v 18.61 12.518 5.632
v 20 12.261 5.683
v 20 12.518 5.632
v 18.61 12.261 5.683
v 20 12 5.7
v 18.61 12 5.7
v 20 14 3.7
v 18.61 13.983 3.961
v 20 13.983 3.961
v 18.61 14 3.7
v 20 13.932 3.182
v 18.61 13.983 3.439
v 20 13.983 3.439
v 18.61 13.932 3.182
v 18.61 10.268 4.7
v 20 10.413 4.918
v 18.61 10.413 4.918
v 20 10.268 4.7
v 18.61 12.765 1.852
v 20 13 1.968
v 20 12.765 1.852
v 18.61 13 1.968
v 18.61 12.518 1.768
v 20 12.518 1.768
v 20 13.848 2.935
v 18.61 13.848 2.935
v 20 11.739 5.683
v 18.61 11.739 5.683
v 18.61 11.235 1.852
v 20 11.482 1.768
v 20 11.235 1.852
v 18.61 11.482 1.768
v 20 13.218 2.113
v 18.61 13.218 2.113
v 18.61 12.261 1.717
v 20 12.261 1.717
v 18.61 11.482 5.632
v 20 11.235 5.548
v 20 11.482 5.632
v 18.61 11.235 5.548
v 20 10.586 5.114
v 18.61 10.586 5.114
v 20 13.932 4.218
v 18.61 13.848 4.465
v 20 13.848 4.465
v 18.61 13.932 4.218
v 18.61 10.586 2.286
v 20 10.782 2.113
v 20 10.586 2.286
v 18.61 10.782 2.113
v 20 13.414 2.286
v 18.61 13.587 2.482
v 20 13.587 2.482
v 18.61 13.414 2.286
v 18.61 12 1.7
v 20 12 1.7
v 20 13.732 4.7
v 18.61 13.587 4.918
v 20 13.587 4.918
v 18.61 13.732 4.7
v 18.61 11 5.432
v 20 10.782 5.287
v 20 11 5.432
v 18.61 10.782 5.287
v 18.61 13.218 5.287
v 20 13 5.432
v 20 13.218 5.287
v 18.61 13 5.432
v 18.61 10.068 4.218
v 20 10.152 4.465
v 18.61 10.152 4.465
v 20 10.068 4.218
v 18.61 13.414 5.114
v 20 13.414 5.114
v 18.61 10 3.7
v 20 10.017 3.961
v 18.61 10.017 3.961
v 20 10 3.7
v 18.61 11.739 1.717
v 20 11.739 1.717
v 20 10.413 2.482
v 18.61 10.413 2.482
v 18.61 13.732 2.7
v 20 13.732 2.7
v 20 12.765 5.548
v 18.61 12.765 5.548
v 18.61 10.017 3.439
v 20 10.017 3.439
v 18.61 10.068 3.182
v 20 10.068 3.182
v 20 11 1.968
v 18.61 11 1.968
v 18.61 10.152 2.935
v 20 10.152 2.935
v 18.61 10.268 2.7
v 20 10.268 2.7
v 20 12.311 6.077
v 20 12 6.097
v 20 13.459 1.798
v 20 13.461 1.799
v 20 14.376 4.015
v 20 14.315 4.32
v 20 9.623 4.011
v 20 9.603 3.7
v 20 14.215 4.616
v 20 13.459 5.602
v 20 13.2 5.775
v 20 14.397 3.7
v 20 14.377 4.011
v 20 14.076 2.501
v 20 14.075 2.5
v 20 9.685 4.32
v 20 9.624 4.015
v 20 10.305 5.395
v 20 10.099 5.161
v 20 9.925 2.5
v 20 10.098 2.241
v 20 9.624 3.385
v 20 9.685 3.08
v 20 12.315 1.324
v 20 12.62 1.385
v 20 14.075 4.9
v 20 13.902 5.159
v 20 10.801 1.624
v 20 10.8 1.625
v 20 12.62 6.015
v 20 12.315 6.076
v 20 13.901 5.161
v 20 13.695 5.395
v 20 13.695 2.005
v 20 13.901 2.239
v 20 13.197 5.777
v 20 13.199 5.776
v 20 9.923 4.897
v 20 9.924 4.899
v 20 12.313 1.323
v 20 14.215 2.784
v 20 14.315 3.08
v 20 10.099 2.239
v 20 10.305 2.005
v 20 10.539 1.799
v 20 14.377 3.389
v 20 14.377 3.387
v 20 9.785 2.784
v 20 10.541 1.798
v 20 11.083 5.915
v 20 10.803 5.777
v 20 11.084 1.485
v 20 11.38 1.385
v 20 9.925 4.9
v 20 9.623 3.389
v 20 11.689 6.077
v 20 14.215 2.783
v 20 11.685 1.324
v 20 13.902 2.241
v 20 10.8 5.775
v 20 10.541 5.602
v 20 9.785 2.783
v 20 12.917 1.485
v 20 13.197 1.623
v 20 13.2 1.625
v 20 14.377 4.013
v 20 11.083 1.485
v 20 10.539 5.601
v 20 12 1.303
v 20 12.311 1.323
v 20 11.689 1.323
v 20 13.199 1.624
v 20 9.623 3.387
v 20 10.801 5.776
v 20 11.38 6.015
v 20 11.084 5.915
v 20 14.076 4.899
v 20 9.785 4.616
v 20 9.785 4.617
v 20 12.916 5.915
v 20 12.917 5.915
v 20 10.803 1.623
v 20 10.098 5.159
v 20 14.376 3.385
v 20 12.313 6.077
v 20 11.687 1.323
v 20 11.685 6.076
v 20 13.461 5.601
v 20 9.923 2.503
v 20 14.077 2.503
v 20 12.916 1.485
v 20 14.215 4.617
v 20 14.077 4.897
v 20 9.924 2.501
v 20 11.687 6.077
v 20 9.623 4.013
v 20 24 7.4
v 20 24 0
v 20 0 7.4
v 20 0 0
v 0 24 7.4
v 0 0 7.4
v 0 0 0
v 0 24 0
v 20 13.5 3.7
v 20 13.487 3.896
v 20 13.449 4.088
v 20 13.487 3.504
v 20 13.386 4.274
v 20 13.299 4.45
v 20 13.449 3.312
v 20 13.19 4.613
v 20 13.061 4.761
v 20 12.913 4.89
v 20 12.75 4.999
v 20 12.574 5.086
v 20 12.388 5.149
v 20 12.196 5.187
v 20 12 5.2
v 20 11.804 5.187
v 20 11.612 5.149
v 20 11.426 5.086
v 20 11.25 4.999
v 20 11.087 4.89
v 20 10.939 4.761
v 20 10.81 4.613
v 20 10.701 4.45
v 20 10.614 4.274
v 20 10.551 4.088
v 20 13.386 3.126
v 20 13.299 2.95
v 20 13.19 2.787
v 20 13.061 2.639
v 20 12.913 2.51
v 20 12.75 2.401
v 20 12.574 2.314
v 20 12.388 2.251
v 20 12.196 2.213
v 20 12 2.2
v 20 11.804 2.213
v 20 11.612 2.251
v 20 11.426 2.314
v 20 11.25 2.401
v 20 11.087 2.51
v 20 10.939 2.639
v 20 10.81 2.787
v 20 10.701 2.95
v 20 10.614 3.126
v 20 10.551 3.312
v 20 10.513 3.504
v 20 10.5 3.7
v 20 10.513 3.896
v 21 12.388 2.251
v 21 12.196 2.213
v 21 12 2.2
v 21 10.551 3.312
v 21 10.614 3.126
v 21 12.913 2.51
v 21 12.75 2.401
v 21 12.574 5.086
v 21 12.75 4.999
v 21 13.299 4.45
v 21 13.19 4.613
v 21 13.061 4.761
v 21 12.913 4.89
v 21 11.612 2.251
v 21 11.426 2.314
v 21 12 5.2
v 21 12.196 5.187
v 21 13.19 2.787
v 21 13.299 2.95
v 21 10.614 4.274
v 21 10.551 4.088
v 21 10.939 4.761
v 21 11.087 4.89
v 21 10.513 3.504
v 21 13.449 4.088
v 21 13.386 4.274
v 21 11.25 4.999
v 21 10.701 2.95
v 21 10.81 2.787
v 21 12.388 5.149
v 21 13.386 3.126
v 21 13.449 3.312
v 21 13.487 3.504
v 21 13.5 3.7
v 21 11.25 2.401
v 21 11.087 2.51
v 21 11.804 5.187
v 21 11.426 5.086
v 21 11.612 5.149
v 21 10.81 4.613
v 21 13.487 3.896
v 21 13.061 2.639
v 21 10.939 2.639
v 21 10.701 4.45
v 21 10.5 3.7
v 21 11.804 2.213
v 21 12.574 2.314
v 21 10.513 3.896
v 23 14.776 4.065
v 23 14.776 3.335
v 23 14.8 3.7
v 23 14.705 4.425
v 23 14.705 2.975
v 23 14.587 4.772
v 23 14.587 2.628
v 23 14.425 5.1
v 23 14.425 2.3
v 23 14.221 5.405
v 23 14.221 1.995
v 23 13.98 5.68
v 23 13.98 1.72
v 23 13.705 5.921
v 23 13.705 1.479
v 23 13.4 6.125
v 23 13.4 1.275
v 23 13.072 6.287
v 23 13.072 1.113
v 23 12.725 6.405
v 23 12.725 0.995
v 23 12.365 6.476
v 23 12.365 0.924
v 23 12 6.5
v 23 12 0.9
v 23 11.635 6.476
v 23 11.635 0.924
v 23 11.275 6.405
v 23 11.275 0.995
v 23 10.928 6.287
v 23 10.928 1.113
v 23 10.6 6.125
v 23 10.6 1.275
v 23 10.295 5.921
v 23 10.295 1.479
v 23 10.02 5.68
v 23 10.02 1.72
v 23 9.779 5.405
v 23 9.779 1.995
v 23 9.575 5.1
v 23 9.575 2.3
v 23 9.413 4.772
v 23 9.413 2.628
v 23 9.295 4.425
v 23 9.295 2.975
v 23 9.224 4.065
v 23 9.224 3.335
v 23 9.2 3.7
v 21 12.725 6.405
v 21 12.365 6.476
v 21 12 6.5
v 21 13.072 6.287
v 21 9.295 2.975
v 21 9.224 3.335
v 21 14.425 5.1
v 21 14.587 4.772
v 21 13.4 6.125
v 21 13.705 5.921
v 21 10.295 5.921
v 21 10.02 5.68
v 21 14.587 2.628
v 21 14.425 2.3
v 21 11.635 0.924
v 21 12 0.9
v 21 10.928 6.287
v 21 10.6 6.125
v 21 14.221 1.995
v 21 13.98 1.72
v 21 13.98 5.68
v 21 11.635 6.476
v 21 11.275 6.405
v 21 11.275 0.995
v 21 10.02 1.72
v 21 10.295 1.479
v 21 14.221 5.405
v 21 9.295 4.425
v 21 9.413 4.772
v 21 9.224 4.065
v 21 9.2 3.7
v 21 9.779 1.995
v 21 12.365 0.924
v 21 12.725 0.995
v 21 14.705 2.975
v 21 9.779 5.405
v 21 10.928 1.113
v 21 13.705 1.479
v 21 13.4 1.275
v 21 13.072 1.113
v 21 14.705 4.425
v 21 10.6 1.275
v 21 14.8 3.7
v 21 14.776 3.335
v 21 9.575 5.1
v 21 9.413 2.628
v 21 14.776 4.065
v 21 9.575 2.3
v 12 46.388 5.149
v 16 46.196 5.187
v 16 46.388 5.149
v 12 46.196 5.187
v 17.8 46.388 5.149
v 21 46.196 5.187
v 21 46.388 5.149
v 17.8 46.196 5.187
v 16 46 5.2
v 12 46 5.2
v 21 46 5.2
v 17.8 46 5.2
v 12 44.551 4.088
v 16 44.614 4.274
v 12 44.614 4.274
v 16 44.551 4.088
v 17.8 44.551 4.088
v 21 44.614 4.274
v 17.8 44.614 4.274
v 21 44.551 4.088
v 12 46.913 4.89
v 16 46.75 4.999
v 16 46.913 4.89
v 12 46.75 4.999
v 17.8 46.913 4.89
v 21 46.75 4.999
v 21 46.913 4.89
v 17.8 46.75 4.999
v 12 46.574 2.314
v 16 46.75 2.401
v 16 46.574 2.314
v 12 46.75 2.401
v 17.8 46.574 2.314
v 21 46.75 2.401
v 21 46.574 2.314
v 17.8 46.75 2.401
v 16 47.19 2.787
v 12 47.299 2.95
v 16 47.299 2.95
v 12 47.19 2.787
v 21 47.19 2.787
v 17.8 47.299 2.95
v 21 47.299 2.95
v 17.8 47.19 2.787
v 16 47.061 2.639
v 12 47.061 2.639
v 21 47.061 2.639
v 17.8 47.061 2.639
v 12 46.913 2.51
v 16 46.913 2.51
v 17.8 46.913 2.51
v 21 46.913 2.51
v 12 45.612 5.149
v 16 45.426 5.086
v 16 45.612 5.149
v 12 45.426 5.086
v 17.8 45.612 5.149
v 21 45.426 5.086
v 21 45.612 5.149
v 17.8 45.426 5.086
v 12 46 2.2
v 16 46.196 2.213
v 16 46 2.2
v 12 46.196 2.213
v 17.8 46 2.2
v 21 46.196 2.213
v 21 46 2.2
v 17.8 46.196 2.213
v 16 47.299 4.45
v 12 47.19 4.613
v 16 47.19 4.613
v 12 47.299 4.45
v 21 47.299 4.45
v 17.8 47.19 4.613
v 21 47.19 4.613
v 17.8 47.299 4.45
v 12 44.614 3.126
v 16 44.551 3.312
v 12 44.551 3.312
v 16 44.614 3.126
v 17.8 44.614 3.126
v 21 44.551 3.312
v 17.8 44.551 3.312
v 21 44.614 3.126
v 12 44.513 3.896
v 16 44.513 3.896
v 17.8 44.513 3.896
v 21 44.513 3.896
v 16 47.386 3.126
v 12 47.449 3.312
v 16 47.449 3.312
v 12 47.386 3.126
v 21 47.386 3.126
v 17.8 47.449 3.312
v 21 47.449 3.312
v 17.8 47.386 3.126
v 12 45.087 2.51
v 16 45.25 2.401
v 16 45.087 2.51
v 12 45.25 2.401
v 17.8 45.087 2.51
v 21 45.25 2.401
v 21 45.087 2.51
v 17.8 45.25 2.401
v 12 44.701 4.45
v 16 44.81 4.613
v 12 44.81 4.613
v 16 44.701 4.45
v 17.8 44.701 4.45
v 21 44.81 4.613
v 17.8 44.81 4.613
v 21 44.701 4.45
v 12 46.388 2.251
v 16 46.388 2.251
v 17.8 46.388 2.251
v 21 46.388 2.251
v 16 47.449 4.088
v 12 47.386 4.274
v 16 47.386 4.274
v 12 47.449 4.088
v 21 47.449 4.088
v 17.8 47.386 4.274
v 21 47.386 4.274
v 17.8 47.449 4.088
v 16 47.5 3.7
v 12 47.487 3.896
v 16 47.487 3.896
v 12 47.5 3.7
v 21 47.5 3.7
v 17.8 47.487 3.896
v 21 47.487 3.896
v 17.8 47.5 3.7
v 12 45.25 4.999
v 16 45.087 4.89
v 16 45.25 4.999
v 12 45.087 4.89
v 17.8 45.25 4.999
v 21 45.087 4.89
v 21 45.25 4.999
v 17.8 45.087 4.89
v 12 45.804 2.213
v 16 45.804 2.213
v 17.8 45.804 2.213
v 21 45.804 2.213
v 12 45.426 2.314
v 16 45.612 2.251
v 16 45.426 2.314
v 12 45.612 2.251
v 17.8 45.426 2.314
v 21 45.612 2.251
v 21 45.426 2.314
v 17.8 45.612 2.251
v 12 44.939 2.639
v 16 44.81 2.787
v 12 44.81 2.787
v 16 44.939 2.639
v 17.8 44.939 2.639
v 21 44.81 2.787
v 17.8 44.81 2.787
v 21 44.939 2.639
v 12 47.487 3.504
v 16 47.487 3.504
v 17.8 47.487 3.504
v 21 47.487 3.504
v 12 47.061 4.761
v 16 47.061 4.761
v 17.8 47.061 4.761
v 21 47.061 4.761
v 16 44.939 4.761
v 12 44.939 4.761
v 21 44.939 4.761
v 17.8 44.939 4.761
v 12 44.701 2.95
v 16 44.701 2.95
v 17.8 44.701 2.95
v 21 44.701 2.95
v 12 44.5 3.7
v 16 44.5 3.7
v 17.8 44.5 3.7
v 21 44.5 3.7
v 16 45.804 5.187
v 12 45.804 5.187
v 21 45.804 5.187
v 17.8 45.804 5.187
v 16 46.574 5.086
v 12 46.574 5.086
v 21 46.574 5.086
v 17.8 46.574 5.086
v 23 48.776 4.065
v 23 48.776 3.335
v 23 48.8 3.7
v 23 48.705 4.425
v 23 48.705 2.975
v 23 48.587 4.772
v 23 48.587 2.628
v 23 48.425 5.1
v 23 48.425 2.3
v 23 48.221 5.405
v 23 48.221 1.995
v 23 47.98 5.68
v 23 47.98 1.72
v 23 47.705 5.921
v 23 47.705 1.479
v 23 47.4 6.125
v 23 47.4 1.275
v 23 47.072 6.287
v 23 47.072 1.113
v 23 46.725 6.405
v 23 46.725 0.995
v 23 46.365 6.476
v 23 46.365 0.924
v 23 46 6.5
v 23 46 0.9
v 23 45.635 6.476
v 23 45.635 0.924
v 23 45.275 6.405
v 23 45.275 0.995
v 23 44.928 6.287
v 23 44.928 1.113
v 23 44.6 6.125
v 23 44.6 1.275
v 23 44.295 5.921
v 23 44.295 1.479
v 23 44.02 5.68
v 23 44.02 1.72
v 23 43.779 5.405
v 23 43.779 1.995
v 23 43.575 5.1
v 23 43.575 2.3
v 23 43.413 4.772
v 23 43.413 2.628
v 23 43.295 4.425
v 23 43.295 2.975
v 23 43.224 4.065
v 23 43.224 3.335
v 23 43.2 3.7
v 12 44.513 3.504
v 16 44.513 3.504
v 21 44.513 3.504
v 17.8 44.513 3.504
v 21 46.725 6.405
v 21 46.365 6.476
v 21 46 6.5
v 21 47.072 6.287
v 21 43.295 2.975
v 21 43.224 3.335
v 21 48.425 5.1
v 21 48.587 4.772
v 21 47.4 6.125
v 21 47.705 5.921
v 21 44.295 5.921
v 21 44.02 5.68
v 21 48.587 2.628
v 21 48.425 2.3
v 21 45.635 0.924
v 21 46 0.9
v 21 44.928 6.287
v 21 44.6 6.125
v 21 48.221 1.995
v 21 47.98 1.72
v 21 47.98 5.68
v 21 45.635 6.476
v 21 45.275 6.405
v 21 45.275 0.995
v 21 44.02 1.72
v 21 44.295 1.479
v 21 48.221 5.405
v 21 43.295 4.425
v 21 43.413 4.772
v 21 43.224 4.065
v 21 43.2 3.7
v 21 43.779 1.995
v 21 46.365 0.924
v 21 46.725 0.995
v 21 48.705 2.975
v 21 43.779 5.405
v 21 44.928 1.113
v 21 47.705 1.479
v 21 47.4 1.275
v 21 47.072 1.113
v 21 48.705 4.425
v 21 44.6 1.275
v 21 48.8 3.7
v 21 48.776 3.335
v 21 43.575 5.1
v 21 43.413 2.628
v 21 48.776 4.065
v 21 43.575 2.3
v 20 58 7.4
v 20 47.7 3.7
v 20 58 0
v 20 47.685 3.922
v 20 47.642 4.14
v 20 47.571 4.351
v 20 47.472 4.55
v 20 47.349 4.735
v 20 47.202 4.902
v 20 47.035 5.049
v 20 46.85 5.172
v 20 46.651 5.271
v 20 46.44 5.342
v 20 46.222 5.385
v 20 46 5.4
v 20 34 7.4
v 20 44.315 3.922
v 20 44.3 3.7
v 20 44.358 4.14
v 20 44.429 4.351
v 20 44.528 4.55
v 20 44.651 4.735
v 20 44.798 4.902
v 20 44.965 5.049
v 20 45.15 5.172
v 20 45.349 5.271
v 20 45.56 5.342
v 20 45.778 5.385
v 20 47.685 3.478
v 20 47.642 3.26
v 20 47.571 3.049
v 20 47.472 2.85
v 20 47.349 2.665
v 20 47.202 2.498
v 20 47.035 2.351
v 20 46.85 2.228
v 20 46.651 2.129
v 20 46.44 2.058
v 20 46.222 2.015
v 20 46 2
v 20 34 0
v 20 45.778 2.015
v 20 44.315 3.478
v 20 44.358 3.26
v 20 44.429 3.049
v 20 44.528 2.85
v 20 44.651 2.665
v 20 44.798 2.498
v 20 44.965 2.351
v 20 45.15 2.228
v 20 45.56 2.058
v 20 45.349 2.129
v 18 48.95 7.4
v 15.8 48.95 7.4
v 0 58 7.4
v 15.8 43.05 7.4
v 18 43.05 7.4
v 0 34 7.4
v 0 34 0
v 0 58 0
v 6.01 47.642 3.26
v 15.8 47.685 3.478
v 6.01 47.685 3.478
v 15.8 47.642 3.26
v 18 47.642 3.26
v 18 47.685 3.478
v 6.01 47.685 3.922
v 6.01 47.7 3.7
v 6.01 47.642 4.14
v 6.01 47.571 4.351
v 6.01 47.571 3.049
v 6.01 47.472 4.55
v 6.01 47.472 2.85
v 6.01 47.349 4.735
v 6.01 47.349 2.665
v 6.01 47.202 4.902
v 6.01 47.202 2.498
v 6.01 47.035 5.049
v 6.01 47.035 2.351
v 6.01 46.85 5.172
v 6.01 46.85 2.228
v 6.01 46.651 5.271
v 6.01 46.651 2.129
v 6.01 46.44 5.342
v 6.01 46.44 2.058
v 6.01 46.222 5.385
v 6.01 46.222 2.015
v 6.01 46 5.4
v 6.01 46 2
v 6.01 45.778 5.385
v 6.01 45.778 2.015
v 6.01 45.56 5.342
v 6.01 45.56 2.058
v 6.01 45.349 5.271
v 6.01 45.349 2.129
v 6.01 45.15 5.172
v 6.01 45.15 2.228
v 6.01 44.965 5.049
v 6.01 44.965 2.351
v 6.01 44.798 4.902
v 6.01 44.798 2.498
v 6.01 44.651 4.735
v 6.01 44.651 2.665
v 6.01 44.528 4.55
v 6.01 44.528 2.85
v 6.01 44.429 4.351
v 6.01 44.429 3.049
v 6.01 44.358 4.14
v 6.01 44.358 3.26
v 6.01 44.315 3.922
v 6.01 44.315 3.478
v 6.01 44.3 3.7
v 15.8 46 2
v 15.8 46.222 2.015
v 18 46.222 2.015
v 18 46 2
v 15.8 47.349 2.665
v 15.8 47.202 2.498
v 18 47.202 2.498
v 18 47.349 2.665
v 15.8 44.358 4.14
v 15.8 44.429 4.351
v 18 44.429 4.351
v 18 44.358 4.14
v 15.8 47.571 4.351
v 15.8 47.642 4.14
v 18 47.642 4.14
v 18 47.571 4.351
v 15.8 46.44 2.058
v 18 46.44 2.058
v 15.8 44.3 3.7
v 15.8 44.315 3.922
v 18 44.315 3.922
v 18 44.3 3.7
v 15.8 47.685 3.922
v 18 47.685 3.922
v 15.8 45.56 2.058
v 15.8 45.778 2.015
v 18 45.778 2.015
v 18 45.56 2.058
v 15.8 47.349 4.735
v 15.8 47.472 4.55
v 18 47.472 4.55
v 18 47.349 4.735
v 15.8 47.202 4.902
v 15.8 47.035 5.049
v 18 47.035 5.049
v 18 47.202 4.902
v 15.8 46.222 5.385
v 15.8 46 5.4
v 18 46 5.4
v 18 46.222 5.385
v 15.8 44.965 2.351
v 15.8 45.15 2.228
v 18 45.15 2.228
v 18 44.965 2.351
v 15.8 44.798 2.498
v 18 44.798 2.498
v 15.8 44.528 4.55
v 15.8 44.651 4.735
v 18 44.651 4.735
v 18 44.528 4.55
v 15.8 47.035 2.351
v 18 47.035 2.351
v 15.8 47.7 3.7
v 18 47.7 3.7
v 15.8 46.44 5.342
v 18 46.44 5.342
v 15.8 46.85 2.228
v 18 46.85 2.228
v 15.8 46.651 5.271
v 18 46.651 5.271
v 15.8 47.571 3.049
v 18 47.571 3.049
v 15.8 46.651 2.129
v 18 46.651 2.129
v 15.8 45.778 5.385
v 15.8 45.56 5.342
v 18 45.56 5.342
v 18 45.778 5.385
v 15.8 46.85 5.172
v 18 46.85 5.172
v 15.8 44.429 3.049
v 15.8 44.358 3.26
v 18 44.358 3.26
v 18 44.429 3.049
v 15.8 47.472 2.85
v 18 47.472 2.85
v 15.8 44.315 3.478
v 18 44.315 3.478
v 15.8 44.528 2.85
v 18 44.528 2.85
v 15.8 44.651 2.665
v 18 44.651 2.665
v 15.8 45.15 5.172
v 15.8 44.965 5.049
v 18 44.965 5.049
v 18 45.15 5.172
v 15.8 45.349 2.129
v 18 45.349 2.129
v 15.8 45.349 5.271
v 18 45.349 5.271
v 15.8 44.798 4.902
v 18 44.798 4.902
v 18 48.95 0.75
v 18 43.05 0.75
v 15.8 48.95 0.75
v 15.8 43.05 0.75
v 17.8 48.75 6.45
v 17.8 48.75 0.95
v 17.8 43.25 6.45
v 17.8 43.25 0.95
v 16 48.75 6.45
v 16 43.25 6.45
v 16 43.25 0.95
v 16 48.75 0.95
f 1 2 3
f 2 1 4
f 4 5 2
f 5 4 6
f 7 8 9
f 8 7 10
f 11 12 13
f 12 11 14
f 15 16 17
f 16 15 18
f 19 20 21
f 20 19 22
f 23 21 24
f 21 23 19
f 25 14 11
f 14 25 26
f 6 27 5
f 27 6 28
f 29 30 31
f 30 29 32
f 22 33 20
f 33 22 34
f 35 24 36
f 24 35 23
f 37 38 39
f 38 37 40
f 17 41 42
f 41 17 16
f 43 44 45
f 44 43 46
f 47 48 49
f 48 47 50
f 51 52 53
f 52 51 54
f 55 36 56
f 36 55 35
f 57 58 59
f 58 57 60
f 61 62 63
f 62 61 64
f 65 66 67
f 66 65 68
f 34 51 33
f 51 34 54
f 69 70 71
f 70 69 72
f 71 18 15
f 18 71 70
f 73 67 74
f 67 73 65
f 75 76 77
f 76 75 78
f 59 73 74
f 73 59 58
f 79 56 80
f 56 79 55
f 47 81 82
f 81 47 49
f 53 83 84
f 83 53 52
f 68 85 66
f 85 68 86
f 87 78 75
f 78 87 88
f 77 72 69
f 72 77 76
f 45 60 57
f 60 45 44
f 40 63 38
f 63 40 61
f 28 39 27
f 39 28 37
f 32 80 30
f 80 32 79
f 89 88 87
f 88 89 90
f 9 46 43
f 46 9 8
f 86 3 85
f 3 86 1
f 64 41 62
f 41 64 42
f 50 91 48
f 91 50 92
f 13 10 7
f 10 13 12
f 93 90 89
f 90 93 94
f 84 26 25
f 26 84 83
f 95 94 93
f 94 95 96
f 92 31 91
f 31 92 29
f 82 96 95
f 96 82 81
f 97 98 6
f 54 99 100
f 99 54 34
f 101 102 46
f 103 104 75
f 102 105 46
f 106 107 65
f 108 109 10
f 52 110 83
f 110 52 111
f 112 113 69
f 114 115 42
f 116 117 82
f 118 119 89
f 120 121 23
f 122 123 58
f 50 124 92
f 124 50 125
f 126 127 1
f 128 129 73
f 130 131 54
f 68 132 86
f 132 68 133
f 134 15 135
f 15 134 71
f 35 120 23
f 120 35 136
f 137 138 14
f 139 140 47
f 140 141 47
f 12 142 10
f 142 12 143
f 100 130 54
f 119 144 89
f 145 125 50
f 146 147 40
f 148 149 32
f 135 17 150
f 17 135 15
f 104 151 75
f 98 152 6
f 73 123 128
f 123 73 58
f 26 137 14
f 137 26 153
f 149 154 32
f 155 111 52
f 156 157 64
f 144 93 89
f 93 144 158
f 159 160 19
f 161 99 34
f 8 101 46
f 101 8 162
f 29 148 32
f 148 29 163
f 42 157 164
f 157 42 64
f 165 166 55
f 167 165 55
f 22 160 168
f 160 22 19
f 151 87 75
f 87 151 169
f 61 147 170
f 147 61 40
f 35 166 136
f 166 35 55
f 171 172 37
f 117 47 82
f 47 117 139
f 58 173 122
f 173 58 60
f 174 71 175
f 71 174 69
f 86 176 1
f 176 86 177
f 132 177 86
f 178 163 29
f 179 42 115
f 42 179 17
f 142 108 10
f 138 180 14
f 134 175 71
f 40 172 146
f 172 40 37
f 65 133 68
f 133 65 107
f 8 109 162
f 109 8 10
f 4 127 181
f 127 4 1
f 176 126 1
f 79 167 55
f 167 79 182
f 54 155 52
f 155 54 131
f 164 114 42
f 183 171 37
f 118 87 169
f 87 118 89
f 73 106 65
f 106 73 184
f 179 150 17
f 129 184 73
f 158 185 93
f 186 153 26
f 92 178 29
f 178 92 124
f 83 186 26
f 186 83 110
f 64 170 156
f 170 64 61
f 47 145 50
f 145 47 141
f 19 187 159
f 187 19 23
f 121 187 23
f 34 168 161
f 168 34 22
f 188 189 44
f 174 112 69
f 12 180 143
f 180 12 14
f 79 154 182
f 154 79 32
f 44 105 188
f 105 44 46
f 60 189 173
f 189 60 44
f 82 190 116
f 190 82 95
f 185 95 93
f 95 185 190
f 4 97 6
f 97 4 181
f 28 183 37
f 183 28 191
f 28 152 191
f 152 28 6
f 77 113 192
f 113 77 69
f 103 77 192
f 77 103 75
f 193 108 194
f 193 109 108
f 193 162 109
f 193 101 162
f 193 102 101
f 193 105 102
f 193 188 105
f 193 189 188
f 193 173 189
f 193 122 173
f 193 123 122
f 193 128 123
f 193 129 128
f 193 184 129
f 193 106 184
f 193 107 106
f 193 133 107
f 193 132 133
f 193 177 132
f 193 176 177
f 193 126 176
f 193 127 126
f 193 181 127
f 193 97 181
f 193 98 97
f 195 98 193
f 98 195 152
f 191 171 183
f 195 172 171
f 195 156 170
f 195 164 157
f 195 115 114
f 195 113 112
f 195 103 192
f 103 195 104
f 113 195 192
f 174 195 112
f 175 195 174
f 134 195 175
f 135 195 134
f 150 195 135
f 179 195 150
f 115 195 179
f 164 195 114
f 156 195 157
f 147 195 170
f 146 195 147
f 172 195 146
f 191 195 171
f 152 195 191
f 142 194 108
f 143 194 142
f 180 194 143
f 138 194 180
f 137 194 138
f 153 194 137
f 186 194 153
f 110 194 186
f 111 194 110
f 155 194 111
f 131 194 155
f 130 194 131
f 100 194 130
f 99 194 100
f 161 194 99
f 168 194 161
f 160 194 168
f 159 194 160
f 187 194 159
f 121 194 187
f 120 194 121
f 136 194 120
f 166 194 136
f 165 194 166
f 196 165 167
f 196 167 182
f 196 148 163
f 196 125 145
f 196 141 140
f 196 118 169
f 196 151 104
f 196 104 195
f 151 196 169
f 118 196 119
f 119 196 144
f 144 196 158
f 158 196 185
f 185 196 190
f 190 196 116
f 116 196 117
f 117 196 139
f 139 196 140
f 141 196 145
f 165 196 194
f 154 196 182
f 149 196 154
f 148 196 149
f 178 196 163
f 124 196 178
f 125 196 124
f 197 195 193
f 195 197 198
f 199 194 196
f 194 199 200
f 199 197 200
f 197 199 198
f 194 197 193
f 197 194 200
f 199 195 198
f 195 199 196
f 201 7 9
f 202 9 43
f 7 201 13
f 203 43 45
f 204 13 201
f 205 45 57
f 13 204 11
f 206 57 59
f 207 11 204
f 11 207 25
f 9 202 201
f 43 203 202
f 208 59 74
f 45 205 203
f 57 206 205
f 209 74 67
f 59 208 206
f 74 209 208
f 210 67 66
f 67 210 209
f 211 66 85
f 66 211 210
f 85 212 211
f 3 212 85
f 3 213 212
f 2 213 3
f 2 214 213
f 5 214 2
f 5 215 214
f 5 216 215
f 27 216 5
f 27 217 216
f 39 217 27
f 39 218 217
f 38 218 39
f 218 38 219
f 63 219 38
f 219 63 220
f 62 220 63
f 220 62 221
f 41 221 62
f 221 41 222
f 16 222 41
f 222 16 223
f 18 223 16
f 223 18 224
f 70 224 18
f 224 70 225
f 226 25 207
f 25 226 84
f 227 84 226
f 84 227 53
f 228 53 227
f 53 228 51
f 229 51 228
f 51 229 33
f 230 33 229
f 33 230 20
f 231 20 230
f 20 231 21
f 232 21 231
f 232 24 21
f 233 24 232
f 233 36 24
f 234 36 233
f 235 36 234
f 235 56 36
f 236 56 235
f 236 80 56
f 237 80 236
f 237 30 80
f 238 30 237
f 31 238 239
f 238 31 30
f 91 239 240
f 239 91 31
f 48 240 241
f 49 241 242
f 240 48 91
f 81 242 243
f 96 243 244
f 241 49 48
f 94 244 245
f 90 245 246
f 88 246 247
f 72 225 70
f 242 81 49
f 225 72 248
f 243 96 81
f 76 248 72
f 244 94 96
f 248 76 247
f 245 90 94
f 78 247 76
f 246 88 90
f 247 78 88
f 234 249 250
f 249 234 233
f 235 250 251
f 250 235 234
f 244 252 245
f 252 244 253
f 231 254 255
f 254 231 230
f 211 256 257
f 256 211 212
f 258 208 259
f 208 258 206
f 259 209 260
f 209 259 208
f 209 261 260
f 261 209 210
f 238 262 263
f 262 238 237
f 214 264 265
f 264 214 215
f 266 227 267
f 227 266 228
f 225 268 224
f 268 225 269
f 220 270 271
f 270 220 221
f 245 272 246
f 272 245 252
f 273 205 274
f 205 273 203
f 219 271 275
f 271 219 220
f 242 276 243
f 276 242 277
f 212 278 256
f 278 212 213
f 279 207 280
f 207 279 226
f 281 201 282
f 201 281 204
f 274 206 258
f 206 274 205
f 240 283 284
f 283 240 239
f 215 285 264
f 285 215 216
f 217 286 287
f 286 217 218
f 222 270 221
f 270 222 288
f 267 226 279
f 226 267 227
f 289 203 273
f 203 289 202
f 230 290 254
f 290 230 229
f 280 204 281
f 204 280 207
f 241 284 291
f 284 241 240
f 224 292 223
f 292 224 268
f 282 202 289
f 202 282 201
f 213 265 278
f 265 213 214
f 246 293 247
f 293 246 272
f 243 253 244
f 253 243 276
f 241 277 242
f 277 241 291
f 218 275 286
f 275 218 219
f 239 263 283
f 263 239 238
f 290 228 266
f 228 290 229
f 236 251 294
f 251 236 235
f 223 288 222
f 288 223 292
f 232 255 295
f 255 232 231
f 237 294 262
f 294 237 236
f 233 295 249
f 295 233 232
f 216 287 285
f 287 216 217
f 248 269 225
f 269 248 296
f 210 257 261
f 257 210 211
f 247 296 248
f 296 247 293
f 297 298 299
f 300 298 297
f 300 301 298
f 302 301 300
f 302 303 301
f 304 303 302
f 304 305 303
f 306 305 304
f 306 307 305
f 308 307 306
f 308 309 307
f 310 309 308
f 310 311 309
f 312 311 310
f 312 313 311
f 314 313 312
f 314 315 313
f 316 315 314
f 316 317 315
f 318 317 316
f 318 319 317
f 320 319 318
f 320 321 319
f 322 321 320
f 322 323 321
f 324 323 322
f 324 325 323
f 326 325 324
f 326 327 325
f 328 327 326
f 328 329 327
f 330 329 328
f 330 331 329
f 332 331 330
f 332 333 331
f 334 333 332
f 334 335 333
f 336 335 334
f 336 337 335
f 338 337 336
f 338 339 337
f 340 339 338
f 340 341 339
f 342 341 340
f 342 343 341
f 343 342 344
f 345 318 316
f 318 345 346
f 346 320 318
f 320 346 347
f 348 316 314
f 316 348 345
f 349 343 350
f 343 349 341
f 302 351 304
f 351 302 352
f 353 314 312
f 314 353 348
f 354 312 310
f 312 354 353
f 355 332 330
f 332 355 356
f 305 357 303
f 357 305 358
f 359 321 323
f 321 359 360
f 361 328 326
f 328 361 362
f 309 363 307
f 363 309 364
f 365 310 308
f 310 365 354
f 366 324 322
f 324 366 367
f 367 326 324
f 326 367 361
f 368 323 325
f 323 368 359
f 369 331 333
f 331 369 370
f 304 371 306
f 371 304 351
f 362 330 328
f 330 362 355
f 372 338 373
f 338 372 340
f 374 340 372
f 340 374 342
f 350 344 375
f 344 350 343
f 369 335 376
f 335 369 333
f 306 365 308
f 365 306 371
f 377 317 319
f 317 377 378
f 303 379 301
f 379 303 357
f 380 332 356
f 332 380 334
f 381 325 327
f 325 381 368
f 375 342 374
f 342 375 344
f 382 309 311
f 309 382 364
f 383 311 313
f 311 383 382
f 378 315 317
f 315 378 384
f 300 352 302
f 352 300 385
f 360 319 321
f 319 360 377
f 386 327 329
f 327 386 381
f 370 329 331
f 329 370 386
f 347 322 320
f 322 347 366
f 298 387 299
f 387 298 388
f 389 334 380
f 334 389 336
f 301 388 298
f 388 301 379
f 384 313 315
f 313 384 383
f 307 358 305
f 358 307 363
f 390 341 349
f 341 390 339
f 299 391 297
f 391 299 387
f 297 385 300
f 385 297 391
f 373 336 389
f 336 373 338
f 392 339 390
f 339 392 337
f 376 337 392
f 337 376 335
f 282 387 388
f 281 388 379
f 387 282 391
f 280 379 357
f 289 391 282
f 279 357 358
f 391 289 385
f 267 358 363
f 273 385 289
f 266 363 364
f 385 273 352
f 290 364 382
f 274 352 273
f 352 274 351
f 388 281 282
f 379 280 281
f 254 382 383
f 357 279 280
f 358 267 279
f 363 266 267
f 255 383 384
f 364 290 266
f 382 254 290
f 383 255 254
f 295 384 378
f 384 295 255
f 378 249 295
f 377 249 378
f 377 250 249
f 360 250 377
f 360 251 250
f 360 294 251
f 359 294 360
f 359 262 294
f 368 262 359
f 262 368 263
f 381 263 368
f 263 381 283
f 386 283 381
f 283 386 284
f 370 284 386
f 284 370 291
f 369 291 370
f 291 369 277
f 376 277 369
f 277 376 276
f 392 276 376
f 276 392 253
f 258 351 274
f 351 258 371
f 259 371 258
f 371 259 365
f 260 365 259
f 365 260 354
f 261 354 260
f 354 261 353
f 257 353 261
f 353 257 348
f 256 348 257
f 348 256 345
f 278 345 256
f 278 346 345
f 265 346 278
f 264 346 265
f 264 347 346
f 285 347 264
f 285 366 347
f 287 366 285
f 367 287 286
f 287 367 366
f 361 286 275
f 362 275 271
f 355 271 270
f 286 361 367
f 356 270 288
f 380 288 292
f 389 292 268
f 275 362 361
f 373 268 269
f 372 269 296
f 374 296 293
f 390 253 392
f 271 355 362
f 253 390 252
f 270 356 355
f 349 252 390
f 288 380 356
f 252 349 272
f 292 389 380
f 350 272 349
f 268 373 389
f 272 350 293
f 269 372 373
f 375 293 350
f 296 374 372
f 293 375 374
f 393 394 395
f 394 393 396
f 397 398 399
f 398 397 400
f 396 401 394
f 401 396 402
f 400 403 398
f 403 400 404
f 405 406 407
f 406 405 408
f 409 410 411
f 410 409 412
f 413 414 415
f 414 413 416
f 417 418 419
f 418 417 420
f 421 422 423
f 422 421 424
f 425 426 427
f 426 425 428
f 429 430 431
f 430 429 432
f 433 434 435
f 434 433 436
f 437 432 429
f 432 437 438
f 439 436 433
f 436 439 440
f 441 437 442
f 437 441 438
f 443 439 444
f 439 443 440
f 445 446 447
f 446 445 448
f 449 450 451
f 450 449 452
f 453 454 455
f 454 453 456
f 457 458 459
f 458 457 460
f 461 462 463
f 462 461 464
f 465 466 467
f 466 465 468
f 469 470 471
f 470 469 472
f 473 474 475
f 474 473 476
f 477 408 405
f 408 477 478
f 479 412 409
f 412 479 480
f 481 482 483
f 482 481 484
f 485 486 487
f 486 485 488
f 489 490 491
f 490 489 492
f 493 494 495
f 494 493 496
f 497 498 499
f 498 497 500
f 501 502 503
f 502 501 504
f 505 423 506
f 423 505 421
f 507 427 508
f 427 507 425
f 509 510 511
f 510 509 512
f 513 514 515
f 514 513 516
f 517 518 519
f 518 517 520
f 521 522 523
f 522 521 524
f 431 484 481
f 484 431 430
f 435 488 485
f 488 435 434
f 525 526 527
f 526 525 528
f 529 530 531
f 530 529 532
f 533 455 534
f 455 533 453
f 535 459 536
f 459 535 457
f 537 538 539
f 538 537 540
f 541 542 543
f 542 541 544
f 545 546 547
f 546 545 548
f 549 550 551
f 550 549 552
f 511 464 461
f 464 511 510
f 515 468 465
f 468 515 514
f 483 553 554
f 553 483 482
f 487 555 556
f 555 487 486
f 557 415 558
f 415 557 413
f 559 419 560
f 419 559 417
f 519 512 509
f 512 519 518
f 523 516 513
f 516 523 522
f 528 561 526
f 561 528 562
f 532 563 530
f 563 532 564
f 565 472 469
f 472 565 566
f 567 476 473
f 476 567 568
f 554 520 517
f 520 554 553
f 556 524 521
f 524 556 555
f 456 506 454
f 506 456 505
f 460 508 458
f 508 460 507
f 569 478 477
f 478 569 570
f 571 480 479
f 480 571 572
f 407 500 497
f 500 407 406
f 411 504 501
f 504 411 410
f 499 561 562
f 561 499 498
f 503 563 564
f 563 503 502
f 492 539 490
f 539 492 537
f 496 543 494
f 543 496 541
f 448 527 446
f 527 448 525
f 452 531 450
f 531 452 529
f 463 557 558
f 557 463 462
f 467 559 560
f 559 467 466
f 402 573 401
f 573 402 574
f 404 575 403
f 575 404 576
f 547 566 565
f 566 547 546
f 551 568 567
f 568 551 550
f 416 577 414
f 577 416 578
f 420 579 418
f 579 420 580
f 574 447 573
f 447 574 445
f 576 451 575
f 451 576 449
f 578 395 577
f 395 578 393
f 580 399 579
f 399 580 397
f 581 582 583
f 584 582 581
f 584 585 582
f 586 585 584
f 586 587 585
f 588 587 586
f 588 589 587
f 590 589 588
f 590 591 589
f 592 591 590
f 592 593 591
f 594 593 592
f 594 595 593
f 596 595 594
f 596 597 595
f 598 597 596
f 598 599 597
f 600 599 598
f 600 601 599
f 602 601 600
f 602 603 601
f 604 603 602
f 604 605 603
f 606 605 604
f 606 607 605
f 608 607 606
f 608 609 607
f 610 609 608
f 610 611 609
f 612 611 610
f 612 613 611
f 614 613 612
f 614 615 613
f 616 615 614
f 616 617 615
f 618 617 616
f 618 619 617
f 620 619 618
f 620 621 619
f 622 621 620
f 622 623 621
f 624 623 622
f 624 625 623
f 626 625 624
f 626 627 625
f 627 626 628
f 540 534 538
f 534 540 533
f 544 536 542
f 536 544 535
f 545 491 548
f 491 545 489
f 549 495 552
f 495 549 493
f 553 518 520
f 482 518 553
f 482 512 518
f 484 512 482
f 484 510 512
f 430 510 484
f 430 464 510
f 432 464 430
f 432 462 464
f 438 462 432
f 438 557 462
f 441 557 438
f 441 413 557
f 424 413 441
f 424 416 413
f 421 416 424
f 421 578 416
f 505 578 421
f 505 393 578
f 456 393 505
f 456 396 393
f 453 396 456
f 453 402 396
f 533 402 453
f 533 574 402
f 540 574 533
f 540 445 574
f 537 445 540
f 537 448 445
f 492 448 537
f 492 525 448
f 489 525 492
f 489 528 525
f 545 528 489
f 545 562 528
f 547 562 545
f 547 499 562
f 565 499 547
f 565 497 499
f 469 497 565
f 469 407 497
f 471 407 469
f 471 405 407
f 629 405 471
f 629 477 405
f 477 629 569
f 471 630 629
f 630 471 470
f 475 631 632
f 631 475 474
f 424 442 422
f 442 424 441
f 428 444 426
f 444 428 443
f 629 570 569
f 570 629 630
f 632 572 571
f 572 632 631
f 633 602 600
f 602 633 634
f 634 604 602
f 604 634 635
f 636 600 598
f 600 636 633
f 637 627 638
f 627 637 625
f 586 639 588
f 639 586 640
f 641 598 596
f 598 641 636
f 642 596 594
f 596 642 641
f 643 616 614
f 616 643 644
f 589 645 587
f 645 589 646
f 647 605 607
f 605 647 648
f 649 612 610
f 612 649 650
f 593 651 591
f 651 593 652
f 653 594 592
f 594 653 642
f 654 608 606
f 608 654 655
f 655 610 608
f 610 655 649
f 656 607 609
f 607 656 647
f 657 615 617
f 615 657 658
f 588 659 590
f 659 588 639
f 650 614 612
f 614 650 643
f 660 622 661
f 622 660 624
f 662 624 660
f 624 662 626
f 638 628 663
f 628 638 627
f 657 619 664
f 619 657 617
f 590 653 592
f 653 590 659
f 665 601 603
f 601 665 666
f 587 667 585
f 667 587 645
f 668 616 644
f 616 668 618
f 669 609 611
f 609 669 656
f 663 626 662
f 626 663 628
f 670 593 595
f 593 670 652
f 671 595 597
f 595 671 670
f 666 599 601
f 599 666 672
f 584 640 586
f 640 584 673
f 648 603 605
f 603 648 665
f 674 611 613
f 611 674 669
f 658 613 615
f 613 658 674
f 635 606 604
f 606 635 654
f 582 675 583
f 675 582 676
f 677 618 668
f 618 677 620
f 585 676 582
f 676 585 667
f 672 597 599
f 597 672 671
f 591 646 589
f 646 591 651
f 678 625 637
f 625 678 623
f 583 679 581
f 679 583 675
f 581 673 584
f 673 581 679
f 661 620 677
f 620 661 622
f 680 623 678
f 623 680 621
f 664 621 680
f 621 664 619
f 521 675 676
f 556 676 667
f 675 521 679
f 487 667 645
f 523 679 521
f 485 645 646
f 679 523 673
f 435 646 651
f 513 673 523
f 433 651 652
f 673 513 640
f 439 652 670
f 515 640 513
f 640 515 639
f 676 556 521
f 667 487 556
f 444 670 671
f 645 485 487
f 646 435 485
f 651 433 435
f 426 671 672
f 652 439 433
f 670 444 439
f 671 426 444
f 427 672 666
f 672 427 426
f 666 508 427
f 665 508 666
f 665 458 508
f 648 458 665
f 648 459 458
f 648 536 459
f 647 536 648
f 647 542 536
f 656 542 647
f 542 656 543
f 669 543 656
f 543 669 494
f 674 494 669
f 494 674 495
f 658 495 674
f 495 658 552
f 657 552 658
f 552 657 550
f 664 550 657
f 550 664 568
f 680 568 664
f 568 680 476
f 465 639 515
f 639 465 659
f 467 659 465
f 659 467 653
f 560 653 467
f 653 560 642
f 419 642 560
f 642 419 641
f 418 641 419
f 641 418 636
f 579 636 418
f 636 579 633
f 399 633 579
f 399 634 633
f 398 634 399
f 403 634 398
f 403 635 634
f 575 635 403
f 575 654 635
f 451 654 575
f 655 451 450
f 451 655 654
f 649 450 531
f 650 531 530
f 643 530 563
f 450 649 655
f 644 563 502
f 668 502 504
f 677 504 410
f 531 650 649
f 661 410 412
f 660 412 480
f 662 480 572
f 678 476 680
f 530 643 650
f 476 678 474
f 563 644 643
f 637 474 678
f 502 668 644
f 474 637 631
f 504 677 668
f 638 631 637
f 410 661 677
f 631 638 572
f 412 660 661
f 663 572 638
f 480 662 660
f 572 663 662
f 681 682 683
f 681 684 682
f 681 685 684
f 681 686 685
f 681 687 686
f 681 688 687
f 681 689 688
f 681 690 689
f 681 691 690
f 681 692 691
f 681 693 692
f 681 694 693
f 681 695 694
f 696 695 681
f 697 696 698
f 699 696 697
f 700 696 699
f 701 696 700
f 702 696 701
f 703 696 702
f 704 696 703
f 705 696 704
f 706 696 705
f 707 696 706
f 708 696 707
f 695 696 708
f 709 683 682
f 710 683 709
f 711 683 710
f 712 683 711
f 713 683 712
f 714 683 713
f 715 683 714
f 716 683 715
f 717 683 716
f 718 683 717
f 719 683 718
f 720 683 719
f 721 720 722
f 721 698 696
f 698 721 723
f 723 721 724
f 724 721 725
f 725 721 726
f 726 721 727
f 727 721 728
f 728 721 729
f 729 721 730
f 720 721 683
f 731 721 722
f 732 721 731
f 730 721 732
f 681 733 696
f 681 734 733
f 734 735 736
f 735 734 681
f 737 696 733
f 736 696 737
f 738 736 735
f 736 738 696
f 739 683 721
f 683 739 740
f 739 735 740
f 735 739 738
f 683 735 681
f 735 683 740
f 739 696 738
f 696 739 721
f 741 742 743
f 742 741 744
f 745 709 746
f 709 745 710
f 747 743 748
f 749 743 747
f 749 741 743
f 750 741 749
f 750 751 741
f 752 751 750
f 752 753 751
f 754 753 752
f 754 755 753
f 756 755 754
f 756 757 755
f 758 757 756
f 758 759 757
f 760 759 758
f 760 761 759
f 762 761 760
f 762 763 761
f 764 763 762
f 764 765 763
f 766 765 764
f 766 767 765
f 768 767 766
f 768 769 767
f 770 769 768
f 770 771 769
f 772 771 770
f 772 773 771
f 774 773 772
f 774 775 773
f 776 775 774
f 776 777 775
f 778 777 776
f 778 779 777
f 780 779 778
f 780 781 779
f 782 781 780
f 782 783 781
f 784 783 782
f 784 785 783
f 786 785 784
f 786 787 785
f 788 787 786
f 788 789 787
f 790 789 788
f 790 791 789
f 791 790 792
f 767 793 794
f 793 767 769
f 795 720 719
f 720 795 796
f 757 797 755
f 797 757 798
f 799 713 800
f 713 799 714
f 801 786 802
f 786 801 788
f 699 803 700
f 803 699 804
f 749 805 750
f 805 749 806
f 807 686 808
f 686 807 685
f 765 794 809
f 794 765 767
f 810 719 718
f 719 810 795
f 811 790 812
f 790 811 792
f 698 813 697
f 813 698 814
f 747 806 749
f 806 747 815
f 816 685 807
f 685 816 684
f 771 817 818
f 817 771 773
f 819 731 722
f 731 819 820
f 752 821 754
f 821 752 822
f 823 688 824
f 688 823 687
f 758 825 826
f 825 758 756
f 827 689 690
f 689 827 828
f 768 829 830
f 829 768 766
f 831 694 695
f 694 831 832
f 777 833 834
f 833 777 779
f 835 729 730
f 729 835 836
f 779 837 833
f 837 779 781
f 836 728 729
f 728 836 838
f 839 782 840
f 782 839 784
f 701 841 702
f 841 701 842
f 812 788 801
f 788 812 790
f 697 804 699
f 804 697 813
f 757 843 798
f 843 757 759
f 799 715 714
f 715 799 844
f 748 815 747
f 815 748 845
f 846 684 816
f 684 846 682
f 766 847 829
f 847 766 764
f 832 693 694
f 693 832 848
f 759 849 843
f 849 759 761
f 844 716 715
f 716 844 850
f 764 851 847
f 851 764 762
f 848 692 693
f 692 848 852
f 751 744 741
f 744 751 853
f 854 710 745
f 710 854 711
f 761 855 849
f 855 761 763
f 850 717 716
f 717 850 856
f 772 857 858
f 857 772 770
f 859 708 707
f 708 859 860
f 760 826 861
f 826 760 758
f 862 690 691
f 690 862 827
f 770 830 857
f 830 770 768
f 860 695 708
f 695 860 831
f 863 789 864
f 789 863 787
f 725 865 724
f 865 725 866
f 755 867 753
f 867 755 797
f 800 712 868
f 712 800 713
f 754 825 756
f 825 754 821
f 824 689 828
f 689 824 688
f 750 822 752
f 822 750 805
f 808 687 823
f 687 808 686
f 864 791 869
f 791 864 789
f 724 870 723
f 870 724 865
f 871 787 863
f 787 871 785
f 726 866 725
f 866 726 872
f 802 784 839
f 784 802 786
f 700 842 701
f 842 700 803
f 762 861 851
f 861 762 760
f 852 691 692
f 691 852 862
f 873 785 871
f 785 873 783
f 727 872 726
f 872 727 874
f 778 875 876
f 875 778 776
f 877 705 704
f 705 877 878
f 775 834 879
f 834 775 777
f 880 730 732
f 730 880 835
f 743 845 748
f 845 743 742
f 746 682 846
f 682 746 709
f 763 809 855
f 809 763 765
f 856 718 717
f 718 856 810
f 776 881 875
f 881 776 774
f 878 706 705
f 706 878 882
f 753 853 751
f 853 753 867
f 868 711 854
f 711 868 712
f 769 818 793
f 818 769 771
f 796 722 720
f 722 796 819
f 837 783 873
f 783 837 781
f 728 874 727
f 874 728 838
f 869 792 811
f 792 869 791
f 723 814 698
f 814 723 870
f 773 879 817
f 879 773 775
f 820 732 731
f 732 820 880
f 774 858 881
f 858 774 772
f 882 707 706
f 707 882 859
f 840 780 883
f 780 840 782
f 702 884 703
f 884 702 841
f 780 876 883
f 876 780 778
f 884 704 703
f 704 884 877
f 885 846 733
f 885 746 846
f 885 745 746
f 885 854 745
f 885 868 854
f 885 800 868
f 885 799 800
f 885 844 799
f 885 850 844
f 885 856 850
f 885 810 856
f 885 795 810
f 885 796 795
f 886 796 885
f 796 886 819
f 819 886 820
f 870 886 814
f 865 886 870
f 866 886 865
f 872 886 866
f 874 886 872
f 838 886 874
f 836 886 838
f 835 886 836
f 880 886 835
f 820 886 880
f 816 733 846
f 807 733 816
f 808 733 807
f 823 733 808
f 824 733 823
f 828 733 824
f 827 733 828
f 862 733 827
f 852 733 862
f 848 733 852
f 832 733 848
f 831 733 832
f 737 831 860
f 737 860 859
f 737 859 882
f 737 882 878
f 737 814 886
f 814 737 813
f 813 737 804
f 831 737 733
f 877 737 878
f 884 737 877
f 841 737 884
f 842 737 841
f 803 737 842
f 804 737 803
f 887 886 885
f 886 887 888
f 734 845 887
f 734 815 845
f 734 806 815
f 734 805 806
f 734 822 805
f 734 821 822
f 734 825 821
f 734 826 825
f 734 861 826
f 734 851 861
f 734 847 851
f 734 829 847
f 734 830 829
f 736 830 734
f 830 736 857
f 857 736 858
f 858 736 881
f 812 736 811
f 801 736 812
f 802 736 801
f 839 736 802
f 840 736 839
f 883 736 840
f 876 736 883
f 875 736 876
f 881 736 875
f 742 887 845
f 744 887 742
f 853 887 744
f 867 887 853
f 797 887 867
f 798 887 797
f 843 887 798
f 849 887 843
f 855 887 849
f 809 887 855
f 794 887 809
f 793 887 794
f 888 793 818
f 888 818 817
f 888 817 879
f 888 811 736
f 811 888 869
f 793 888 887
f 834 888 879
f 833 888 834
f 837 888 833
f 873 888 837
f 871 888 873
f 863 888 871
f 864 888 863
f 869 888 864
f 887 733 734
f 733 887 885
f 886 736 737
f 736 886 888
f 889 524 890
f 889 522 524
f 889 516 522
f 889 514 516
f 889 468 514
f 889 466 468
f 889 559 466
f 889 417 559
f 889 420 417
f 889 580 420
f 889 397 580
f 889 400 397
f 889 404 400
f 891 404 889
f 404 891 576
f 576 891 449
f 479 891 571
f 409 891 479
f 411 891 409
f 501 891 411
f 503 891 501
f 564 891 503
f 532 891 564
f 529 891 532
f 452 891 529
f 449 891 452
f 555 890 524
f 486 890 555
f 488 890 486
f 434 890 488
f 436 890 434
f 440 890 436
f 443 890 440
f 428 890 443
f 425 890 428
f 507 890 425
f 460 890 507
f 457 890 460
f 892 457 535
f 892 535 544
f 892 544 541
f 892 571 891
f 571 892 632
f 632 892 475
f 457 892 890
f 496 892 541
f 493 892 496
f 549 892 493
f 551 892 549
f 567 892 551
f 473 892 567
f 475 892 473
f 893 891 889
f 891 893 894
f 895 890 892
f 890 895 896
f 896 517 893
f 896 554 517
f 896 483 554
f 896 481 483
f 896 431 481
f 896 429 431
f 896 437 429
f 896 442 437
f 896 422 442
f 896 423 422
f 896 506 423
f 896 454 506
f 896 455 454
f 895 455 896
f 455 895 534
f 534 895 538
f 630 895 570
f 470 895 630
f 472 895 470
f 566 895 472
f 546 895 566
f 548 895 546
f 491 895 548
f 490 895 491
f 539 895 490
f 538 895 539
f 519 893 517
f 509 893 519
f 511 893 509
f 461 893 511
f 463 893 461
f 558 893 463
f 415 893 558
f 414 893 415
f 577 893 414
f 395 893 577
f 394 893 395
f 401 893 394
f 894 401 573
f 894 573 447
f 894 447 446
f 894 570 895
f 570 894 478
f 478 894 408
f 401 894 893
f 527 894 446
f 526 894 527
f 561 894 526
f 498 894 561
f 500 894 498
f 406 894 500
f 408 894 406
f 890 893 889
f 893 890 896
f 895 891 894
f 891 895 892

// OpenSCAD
// Review proto (not a part): a ladder's rear post around one brace screw, today (a heat-set insert in the
// 7.4 mm edge: 1.7 mm of wall each side) and proposed (a DIN 562 M3 square nut in a pocket cut from the
// ladder's top face, the screw through a plain Ø3.4 hole).  Printed flat as the ladder is, the pocket is
// open upwards: nothing to bridge.  docs/printed-parts-review.md › Ladder.
//
//   openscad -D 'VIEW="both"' -o ladder_nut_trap.png mechanical/review/proto/ladder_nut_trap.scad
VIEW = "both";          // today | proposed | both
T = 7.4;                // ladder thickness (printed flat: Z)
POST = 8;               // rear post width (frame Y)
H = 24;                 // slice height along the post
NUT = [5.5, 5.5, 1.8];  // DIN 562 M3 square nut
NUT_CLEAR = 0.2;        // per side in the pocket
NUT_SET = 2.2;          // the nut's rear face from the rear edge: the wall the brace's preload pulls on
INSERT = [4.0, 6.2];    // today's insert hole Ø, depth
$fn = 48;

module post_slice() cube([POST + 12, H, T]);     // +12: the band the post joins

module today() difference() {
    post_slice();
    translate([POST + 12 + 0.01, H / 2, T / 2]) rotate([0, -90, 0]) {
        cylinder(d = INSERT[0], h = INSERT[1] + 0.01);
        cylinder(d1 = INSERT[0] + 0.8, d2 = INSERT[0], h = 1.4);
    }
}

module proposed() difference() {
    post_slice();
    // the screw's plain hole from the rear edge
    translate([POST + 12 + 0.01, H / 2, T / 2]) rotate([0, -90, 0]) cylinder(d = 3.4, h = 14);
    // the nut pocket, open to the top face (printed flat: the top face is the last layers, no bridge)
    translate([POST + 12 - NUT_SET - NUT[2] - NUT_CLEAR, H / 2 - NUT[0] / 2 - NUT_CLEAR, T / 2 - NUT[0] / 2 - NUT_CLEAR])
        cube([NUT[2] + 2 * NUT_CLEAR, NUT[0] + 2 * NUT_CLEAR, T]);
}

module nut() color("#c9a227") translate([POST + 12 - NUT_SET - NUT[2], H / 2 - NUT[0] / 2, T / 2 - NUT[0] / 2])
    difference() { cube([NUT[2], NUT[0], NUT[1]]); translate([-1, NUT[0] / 2, NUT[1] / 2]) rotate([0, 90, 0]) cylinder(d = 2.5, h = 5); }
module screw() color("#888") translate([POST + 12 + 3, H / 2, T / 2]) rotate([0, -90, 0]) { cylinder(d = 3, h = 11); cylinder(d = 5.6, h = 2); }
module insert() color("#b87333") translate([POST + 12 - INSERT[1], H / 2, T / 2]) rotate([0, 90, 0]) difference() { cylinder(d = 4.0, h = INSERT[1]); cylinder(d = 3, h = INSERT[1] + 1); }

if (VIEW == "today" || VIEW == "both") { color("#a9c4e4") today(); insert(); screw(); }
if (VIEW == "proposed" || VIEW == "both") translate([0, VIEW == "both" ? H + 10 : 0, 0]) { color("#a9c4e4") proposed(); nut(); screw(); }
